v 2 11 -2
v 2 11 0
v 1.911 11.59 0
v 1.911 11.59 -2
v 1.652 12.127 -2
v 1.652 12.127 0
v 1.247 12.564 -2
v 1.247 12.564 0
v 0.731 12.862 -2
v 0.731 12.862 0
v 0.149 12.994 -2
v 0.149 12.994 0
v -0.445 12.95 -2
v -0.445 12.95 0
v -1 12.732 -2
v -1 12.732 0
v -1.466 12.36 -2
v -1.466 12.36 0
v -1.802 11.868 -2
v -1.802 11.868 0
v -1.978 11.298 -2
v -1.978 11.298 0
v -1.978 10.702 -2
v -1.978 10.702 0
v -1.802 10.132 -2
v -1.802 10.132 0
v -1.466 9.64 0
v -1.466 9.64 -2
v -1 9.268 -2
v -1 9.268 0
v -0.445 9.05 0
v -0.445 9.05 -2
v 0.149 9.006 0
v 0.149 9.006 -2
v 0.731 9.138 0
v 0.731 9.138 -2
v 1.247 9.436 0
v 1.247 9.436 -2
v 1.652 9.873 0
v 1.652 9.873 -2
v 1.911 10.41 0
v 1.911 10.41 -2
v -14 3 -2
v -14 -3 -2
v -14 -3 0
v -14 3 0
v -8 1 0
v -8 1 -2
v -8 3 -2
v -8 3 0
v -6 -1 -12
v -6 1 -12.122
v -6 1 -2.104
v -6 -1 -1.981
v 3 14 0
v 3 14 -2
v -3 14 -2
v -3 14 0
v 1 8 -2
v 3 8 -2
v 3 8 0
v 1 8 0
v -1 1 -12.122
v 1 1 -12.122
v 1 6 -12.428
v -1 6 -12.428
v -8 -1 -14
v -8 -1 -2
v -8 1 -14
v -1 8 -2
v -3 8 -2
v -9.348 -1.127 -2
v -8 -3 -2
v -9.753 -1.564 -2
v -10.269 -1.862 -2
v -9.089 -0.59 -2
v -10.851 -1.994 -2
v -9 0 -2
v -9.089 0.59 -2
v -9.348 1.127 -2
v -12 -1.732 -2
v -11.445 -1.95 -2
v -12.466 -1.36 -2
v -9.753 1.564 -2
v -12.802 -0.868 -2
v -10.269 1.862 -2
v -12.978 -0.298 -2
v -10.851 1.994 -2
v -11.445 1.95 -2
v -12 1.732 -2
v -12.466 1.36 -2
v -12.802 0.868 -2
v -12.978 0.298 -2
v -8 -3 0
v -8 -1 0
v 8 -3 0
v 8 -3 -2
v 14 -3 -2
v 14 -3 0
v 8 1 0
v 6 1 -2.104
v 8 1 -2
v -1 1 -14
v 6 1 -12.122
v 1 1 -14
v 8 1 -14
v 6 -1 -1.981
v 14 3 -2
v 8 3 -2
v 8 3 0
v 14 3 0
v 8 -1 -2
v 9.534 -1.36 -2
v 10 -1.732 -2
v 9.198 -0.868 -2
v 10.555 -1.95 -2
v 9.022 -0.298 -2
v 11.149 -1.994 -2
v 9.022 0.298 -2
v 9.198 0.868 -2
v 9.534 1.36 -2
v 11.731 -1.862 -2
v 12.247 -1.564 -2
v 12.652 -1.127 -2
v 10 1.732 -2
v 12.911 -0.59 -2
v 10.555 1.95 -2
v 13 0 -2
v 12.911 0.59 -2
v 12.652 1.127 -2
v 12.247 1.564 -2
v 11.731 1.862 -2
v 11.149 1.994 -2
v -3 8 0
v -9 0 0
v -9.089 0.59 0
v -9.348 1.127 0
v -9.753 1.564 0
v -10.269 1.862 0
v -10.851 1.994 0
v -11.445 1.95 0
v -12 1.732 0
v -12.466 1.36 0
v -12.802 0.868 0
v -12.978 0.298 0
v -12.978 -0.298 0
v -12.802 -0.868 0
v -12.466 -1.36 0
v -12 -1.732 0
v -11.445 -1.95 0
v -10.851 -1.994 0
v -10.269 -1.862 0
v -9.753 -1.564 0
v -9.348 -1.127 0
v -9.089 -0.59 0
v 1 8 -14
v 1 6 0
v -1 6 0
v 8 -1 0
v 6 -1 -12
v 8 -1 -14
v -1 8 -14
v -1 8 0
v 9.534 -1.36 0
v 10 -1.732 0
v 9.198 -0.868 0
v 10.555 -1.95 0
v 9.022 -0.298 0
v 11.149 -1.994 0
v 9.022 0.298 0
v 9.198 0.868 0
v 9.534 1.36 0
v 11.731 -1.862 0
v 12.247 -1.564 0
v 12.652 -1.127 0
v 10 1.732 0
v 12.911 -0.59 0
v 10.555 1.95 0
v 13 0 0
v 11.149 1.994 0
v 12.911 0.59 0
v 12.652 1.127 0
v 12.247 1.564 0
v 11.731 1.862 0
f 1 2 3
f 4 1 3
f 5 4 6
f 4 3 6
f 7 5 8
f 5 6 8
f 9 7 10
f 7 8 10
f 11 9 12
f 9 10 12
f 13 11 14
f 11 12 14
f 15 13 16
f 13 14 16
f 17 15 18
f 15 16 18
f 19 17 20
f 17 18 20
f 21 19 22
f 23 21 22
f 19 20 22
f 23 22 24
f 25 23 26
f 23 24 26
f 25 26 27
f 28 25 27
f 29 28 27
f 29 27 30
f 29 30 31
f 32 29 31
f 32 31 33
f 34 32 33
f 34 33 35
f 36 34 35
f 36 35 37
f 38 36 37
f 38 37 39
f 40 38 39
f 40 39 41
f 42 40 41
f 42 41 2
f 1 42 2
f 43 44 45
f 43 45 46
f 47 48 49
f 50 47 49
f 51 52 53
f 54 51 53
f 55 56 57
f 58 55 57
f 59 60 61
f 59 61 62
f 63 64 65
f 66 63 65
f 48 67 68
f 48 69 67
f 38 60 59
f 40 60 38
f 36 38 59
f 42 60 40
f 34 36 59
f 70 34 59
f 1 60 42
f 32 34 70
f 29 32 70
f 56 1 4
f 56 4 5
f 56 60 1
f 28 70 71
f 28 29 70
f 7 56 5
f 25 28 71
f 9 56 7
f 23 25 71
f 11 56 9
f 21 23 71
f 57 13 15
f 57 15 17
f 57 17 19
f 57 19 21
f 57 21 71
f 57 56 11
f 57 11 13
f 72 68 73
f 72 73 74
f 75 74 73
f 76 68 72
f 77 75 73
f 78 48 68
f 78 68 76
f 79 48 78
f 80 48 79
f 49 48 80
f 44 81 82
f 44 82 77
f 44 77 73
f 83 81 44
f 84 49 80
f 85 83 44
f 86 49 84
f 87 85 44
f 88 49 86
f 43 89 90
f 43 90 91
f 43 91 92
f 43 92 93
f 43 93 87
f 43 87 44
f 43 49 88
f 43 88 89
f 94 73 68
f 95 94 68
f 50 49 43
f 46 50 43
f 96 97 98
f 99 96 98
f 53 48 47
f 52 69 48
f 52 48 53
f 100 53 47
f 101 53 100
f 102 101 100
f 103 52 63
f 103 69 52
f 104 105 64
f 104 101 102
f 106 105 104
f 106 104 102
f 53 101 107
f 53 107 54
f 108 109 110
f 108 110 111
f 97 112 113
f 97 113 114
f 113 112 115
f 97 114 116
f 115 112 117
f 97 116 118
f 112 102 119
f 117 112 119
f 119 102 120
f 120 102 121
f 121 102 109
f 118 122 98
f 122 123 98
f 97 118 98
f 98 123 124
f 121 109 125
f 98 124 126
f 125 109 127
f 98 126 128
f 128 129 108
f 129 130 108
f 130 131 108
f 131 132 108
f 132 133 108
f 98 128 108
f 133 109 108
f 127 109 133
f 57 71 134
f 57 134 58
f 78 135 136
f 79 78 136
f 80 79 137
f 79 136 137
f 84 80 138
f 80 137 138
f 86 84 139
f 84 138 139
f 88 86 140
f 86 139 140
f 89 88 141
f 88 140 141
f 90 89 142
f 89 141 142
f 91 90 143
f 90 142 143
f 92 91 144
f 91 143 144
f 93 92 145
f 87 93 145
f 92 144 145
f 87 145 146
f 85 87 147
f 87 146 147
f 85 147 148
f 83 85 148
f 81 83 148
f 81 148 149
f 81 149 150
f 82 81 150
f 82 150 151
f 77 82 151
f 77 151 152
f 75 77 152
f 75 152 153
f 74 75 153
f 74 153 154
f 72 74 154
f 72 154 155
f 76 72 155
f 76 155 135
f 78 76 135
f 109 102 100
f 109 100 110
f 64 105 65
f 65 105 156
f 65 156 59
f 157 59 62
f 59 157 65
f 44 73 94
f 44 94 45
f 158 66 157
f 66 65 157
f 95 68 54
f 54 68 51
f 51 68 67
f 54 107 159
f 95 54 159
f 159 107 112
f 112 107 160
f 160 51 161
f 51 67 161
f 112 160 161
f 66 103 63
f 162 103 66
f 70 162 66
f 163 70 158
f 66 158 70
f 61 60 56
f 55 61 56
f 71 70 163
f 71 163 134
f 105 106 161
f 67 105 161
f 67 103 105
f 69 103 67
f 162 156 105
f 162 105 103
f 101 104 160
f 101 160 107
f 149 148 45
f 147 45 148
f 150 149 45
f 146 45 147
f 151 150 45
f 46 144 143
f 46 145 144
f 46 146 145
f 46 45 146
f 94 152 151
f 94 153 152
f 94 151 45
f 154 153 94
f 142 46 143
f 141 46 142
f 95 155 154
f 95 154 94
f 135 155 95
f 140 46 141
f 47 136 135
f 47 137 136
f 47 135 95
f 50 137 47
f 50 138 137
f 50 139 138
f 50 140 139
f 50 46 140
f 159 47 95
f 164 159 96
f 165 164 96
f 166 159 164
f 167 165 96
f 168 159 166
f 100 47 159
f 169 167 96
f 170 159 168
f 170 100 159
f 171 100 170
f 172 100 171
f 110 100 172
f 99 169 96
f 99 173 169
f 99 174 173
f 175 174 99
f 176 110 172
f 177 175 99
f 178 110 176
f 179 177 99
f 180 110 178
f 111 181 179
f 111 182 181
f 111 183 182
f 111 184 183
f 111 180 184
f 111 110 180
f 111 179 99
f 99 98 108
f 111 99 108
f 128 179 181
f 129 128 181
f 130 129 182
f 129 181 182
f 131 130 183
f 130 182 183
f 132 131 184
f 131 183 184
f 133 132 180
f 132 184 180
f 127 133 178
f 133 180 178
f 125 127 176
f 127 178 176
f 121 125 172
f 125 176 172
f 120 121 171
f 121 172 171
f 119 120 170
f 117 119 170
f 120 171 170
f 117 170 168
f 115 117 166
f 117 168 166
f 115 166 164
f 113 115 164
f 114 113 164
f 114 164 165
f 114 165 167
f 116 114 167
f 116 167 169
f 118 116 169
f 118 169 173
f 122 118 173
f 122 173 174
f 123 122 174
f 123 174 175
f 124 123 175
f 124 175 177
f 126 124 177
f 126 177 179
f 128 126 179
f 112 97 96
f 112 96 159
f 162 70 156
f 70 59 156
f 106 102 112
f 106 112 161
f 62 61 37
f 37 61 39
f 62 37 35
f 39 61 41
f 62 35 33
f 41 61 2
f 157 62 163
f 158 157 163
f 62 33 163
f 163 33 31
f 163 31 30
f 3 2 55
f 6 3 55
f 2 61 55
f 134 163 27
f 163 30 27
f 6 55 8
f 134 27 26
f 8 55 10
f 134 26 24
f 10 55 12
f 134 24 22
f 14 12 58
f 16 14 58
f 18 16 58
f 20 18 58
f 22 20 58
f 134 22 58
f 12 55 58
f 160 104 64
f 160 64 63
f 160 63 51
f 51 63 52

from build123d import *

# Parameters (mm, degrees)
SKETCH6_W           = 12
SKETCH6_H           = 8
BOSS_EXTRUDE5_DEPTH = 1
SKETCH7_W           = 6
SKETCH7_H           = 2
BOSS_EXTRUDE6_DEPTH = 2
SKETCH8_W           = 12
SKETCH8_H           = 10
CUT_EXTRUDE4_DEPTH  = 2.5
BOSS_EXTRUDE7_DEPTH = 1
SKETCH12_W          = 6
SKETCH12_H          = 6
BOSS_EXTRUDE9_DEPTH = 2
SKETCH13_R          = 2
CUT_EXTRUDE7_DEPTH  = 25.248711306


with BuildPart() as part:
    # Sketch6 → Boss-Extrude5 (new, symmetric)
    with BuildSketch(Plane(origin=(0, 0, 0), x_dir=(1, 0, 0), z_dir=(0, 1, 0))):
        Polygon((-14, 0), (14, 0), (14, 2), (8, 2), (8, 14), (-8, 14), (-8, 2), (-14, 2), align=None)
        with Locations((0, 8)):
            Rectangle(SKETCH6_W, SKETCH6_H, mode=Mode.SUBTRACT)
    extrude(amount=BOSS_EXTRUDE5_DEPTH, both=True)

    # Sketch7 → Boss-Extrude6 (add)
    with BuildSketch(Plane(origin=(0, 0, -2), x_dir=(-1, 0, 0), z_dir=(0, 0, -1))):
        with Locations((11, 2)):
            Rectangle(SKETCH7_W, SKETCH7_H)
        with Locations((11, -2)):
            Rectangle(SKETCH7_W, SKETCH7_H)
    boss_extrude6 = extrude(amount=-BOSS_EXTRUDE6_DEPTH)

    # Mirror2: Boss-Extrude6 across plane
    add(boss_extrude6.mirror(Plane(origin=(0, 0, 0), x_dir=(0, 0, 1), z_dir=(1, 0, 0))))

    # Sketch8 → Cut-Extrude4 (cut, symmetric)
    with BuildSketch(Plane(origin=(0, -0.265057015, 0.016211582), x_dir=(-1, 0, 0), z_dir=(0, 0.9981347984218666, -0.061048539534864034))):
        with Locations((0, -7.038666121)):
            Rectangle(SKETCH8_W, SKETCH8_H)
    extrude(amount=CUT_EXTRUDE4_DEPTH, both=True, mode=Mode.SUBTRACT)

    # Sketch10 → Boss-Extrude7 (add, symmetric)
    with BuildSketch(Plane(origin=(0, 0, 0), x_dir=(0, 0, -1), z_dir=(1, 0, 0))):
        Polygon((12.12232524, 1), (12.428138341, 6), (0, 6), (0, 14), (2, 14), (2, 8), (14, 8), (14, 1), align=None)
    extrude(amount=BOSS_EXTRUDE7_DEPTH, both=True)

    # Sketch12 → Boss-Extrude9 (add)
    with BuildSketch(Plane(origin=(0, 0, -2), x_dir=(-1, 0, 0), z_dir=(0, 0, -1))):
        with Locations((0, 11)):
            Rectangle(SKETCH12_W, SKETCH12_H)
    extrude(amount=-BOSS_EXTRUDE9_DEPTH)

    # Sketch13 → Cut-Extrude7 (cut, through all)
    with BuildSketch(Plane.XY):
        with Locations((-11, 0)):
            Circle(SKETCH13_R)
        with Locations((11, 0)):
            Circle(SKETCH13_R)
        with Locations((0, 11)):
            Circle(SKETCH13_R)
    extrude(amount=-CUT_EXTRUDE7_DEPTH, mode=Mode.SUBTRACT)


solid = part.part
